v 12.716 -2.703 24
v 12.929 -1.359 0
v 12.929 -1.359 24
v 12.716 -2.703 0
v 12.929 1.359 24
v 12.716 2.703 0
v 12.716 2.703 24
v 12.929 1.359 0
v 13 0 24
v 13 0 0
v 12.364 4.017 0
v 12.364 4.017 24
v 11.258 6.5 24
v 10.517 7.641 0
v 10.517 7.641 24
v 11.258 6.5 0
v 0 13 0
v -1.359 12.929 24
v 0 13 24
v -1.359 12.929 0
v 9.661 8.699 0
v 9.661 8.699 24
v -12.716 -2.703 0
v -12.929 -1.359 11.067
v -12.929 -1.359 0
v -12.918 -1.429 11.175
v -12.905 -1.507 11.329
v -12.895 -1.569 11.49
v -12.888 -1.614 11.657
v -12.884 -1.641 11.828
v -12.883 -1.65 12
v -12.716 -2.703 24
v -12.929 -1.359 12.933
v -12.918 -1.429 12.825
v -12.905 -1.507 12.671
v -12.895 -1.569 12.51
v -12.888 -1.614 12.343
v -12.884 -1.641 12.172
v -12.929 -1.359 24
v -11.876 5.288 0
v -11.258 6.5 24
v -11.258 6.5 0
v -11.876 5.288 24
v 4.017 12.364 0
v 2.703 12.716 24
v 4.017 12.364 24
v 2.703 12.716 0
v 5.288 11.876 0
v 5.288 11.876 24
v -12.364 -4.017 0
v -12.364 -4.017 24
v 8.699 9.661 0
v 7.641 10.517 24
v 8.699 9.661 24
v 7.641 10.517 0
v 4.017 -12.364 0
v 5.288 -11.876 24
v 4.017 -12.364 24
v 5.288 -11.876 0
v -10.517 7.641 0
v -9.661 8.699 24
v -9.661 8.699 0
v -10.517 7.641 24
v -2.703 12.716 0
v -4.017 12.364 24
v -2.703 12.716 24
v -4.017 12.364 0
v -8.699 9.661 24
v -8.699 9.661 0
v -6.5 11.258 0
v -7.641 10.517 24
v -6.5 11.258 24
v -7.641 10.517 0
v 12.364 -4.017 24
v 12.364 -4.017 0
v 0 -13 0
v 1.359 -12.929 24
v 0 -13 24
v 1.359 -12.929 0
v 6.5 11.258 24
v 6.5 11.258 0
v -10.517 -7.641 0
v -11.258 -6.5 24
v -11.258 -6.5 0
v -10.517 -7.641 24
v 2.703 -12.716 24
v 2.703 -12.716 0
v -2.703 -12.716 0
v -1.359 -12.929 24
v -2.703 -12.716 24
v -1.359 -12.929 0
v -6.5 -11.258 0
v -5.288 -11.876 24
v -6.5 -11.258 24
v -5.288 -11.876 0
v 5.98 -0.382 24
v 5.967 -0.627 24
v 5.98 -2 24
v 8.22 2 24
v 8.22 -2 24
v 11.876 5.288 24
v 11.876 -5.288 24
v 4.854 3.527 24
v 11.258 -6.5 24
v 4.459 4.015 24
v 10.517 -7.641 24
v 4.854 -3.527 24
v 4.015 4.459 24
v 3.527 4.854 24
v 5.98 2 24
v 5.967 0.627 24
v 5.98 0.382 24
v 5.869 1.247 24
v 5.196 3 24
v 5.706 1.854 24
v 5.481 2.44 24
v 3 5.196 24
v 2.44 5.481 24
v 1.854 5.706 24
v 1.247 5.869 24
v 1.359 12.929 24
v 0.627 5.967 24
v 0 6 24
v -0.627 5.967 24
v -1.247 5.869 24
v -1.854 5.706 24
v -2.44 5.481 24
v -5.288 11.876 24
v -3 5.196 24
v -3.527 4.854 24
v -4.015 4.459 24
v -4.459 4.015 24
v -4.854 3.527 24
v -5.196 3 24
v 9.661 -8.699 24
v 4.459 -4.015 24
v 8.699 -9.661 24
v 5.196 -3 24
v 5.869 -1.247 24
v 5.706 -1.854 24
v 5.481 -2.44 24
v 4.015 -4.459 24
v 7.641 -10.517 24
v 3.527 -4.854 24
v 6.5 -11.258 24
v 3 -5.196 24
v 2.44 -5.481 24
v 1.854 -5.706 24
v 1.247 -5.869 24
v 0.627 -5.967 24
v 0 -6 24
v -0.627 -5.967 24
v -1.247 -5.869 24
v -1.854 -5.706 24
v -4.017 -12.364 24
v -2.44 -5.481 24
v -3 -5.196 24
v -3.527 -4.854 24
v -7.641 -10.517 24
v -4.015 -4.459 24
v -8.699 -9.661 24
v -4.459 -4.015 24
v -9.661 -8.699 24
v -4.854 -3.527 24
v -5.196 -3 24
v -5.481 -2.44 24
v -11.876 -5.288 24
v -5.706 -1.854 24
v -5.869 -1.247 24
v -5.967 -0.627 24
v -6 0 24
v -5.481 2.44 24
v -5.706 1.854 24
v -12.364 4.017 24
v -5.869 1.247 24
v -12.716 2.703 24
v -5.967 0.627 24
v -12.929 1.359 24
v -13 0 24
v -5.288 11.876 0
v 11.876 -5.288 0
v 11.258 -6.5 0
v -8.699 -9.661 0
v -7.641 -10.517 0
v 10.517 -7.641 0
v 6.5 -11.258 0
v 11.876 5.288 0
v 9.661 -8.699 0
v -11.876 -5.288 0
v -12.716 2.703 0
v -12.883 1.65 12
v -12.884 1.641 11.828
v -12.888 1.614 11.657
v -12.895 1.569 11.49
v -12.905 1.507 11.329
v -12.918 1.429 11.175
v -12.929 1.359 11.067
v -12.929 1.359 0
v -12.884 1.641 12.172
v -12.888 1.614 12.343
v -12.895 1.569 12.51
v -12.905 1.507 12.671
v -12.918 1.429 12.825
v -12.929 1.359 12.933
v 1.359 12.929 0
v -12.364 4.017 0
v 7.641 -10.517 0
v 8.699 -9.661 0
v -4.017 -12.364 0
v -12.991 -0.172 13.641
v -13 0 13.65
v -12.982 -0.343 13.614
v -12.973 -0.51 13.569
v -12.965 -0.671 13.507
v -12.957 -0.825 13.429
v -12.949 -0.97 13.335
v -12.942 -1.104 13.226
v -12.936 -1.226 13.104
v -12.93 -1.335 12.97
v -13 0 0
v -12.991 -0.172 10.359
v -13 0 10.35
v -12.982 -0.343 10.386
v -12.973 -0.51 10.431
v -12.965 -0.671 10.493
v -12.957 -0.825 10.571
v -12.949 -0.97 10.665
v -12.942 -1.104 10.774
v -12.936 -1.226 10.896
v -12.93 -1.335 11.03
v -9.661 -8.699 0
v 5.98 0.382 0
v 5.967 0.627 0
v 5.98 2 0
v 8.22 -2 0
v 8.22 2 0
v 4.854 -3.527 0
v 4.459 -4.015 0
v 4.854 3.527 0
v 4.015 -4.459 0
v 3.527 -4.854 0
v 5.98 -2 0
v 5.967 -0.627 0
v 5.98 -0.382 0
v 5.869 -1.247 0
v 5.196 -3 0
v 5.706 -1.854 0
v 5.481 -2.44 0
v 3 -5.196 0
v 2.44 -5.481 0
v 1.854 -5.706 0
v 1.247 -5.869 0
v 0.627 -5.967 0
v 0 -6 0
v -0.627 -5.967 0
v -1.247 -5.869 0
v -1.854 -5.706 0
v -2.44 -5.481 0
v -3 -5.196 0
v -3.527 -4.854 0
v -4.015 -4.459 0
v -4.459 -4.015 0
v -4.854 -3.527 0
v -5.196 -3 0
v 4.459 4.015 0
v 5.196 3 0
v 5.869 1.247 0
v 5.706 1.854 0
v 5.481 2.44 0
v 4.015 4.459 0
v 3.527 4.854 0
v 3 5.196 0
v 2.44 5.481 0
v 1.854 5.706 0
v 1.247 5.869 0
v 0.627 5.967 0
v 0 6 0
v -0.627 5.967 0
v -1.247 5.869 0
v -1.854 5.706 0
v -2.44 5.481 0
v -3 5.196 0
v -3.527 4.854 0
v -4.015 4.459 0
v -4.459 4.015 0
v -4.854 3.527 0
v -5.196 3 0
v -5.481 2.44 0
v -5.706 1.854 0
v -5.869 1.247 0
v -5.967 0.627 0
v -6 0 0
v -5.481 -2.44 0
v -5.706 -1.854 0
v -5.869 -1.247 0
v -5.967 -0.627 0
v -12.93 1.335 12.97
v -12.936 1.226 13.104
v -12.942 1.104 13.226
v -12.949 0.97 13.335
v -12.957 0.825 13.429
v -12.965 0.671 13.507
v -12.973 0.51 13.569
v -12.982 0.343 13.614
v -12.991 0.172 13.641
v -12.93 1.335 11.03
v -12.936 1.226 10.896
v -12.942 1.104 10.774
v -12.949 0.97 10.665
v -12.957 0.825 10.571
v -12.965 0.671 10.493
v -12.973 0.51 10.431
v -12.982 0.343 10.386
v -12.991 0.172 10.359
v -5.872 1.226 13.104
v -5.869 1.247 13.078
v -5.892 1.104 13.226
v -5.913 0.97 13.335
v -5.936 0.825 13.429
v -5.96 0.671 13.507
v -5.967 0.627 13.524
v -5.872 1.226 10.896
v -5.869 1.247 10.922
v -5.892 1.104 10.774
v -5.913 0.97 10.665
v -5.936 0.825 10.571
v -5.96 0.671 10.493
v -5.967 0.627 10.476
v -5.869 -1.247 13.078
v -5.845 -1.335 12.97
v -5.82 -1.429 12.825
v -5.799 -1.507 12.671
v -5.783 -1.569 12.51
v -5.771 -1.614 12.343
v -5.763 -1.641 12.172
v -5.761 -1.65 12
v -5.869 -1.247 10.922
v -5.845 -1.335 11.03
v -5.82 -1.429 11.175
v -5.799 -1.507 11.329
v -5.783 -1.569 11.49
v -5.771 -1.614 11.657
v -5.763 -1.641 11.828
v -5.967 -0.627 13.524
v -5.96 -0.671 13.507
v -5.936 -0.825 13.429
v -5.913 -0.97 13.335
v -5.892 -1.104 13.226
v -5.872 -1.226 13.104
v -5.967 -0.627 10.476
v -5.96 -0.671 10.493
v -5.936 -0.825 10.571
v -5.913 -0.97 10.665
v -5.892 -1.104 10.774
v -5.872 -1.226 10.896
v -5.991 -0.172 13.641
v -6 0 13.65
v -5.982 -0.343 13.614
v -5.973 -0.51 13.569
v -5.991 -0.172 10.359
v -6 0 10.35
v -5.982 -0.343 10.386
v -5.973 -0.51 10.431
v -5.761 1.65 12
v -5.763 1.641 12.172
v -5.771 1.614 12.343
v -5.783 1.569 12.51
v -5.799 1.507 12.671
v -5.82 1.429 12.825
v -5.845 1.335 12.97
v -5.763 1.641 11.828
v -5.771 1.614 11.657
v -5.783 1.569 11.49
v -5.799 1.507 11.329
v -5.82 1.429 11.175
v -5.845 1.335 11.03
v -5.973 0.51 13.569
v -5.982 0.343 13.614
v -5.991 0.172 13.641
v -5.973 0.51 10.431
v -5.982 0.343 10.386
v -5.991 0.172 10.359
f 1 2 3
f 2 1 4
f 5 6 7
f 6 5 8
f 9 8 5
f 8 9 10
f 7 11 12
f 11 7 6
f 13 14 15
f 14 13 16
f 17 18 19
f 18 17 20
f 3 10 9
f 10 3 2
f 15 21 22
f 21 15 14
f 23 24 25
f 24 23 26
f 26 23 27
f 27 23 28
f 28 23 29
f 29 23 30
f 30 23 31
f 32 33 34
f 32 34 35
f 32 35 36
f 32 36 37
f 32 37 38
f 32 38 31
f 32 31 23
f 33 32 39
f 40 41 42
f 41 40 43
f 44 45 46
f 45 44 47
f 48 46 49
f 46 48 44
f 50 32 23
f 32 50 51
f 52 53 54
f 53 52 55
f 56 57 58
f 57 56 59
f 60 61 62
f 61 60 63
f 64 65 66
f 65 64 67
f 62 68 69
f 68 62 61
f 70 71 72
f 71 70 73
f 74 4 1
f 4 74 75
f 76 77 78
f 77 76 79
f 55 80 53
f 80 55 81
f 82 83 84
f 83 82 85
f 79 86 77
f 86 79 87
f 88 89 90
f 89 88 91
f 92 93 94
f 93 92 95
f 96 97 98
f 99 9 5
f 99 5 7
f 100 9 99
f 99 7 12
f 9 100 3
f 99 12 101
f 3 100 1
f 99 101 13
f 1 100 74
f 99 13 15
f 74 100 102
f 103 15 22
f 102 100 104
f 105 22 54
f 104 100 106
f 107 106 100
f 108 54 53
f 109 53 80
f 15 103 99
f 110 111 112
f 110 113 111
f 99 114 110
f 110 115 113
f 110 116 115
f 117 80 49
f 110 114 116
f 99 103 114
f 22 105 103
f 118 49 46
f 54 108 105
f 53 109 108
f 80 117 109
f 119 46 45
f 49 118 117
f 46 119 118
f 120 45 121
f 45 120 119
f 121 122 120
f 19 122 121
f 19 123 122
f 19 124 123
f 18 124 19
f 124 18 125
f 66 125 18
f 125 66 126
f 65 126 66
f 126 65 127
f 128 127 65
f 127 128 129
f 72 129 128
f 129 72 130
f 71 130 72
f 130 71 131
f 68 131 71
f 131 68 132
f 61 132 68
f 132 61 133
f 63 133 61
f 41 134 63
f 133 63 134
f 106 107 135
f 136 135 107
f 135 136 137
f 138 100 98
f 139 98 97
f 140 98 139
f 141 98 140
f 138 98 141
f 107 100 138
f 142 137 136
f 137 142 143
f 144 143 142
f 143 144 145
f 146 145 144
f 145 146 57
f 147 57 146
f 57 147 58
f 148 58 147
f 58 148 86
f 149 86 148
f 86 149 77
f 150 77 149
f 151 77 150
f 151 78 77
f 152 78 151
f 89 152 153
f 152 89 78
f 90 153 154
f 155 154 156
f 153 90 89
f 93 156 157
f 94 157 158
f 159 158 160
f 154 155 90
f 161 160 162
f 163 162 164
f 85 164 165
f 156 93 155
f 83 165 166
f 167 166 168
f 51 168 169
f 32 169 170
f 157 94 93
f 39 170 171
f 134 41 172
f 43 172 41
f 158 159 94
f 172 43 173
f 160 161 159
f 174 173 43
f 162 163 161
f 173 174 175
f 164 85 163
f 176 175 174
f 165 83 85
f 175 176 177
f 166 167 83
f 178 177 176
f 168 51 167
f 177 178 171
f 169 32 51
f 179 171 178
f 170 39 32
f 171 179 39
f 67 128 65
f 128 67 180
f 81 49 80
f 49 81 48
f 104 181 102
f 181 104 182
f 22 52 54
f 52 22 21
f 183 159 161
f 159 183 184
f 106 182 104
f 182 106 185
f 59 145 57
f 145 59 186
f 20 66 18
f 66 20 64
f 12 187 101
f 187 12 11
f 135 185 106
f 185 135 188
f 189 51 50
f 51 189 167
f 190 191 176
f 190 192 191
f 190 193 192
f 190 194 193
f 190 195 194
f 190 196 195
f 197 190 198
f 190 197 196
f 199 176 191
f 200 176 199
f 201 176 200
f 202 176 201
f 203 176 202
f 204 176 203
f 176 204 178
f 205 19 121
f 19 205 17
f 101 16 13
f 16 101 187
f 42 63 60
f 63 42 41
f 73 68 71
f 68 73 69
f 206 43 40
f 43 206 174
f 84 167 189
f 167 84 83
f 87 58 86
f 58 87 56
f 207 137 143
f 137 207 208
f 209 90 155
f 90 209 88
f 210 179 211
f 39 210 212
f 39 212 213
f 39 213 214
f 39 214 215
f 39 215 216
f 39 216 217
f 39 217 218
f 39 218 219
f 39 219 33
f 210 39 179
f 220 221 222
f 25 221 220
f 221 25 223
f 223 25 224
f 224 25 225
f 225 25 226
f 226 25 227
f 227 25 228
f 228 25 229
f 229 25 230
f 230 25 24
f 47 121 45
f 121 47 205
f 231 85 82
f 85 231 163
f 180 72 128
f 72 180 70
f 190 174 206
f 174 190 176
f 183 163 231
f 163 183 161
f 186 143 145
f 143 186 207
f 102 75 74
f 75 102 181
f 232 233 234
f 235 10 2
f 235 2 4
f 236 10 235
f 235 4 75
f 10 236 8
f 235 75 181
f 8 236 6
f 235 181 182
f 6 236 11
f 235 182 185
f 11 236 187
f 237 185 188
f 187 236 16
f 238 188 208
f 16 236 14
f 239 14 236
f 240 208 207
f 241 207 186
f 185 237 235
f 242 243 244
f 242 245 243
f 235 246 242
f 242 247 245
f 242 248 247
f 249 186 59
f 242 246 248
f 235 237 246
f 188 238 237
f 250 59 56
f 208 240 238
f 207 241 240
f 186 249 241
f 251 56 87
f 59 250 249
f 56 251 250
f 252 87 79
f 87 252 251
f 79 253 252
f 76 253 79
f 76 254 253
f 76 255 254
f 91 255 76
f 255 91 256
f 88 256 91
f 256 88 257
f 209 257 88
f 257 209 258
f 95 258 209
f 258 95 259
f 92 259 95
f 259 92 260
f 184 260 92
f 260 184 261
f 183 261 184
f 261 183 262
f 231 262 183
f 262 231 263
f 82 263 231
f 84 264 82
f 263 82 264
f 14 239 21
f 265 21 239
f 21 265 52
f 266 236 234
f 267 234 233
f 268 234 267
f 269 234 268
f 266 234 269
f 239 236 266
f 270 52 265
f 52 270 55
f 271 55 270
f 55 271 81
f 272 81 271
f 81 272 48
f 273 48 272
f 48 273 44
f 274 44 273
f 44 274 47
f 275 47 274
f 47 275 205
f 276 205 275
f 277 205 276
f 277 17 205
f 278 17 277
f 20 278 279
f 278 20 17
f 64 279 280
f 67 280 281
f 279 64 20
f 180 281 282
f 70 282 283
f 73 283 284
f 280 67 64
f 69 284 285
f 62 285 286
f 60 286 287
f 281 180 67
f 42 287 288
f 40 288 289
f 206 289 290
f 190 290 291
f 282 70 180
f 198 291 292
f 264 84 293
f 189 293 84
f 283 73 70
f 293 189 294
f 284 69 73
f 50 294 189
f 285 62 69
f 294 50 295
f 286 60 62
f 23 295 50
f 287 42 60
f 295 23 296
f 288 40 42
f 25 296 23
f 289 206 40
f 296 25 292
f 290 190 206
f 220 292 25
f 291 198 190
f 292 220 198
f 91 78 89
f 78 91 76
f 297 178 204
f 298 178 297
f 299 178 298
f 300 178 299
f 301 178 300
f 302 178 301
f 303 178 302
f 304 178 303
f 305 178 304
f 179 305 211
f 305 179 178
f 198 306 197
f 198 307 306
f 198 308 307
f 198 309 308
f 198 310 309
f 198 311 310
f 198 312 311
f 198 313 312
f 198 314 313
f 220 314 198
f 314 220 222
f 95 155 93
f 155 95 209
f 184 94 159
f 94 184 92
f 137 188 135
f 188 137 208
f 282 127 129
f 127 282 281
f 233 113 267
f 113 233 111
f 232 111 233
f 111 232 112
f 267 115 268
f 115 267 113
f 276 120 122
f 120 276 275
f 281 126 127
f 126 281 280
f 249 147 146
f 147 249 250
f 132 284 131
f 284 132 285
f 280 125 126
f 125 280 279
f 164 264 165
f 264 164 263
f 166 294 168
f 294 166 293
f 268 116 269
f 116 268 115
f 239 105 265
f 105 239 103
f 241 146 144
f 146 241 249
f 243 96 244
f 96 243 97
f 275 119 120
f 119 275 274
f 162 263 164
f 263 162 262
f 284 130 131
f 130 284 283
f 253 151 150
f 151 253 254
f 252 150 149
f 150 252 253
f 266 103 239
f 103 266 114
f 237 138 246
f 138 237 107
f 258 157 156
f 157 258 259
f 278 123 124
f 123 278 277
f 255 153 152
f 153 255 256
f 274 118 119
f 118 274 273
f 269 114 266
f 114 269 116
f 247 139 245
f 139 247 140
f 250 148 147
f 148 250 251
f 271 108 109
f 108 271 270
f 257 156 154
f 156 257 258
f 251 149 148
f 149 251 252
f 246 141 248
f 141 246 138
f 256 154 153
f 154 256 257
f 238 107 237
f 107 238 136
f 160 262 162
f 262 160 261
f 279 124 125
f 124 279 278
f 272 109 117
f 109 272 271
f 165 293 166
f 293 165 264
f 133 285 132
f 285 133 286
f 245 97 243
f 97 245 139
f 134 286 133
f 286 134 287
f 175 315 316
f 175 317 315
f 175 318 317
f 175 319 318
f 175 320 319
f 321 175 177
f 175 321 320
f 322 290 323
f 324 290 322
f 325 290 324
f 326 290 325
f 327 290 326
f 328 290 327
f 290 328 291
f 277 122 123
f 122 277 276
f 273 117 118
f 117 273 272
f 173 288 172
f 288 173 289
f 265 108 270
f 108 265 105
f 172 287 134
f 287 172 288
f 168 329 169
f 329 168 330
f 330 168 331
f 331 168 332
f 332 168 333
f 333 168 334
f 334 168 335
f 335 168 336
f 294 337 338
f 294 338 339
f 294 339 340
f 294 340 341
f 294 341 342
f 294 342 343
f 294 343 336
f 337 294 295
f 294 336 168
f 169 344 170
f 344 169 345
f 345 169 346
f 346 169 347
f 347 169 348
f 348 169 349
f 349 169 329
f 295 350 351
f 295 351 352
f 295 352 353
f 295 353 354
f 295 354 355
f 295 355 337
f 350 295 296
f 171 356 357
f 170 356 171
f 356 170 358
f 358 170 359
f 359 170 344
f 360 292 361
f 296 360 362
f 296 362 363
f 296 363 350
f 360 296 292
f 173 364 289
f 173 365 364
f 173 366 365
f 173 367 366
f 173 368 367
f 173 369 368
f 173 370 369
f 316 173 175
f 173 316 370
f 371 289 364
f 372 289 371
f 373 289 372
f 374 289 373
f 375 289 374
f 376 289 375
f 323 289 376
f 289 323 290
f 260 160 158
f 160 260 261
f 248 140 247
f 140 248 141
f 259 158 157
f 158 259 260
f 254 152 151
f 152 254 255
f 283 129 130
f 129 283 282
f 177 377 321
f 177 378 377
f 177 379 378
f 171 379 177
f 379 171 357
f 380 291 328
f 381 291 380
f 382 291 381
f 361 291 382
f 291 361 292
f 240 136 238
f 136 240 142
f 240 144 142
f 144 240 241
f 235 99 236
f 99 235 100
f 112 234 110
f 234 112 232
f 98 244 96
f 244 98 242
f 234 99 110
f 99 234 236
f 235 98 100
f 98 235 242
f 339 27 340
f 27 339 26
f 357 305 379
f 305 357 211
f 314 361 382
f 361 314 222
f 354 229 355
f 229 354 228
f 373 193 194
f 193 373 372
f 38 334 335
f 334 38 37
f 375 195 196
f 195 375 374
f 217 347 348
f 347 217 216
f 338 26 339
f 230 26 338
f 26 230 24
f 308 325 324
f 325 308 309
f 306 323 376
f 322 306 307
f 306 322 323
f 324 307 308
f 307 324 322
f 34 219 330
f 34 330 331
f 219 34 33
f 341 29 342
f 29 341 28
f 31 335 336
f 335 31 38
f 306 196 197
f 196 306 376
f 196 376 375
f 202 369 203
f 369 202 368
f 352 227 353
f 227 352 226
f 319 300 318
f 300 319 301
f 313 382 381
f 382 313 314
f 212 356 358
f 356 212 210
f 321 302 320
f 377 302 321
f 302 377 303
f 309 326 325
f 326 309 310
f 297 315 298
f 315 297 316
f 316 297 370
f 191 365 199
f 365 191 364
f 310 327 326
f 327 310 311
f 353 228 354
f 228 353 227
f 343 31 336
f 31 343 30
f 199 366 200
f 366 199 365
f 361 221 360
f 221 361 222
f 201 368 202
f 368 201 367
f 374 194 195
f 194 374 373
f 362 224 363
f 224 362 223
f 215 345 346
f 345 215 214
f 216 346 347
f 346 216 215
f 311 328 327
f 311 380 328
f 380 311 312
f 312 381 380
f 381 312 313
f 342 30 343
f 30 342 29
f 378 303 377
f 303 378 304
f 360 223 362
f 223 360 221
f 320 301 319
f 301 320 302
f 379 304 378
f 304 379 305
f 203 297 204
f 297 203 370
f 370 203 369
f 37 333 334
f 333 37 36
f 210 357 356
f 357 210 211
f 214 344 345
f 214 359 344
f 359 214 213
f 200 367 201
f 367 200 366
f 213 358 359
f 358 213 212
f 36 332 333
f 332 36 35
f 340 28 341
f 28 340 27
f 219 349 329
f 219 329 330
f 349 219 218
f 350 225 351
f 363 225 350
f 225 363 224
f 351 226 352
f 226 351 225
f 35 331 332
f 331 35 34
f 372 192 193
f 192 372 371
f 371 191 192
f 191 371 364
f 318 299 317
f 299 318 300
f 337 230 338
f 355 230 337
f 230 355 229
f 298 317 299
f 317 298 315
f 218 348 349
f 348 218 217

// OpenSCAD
// Keyway hub for a 12 mm shaft.
$fn = 60;
eps = 0.02;
shaft_d = 12;
outer_d = 26;
length = 24;
key_w = 4;
key_depth = 2.2;
difference() {
    cylinder(d = outer_d, h = length);
    translate([0, 0, -eps]) cylinder(d = shaft_d, h = length + 2 * eps);
    translate([shaft_d / 2 - eps, -key_w / 2, -eps]) cube([key_depth + 2 * eps, key_w, length + 2 * eps]);
    translate([-outer_d / 2 - eps, 0, length / 2]) rotate([0, 90, 0]) cylinder(d = 3.3, h = outer_d / 2 + 2 * eps);
}
